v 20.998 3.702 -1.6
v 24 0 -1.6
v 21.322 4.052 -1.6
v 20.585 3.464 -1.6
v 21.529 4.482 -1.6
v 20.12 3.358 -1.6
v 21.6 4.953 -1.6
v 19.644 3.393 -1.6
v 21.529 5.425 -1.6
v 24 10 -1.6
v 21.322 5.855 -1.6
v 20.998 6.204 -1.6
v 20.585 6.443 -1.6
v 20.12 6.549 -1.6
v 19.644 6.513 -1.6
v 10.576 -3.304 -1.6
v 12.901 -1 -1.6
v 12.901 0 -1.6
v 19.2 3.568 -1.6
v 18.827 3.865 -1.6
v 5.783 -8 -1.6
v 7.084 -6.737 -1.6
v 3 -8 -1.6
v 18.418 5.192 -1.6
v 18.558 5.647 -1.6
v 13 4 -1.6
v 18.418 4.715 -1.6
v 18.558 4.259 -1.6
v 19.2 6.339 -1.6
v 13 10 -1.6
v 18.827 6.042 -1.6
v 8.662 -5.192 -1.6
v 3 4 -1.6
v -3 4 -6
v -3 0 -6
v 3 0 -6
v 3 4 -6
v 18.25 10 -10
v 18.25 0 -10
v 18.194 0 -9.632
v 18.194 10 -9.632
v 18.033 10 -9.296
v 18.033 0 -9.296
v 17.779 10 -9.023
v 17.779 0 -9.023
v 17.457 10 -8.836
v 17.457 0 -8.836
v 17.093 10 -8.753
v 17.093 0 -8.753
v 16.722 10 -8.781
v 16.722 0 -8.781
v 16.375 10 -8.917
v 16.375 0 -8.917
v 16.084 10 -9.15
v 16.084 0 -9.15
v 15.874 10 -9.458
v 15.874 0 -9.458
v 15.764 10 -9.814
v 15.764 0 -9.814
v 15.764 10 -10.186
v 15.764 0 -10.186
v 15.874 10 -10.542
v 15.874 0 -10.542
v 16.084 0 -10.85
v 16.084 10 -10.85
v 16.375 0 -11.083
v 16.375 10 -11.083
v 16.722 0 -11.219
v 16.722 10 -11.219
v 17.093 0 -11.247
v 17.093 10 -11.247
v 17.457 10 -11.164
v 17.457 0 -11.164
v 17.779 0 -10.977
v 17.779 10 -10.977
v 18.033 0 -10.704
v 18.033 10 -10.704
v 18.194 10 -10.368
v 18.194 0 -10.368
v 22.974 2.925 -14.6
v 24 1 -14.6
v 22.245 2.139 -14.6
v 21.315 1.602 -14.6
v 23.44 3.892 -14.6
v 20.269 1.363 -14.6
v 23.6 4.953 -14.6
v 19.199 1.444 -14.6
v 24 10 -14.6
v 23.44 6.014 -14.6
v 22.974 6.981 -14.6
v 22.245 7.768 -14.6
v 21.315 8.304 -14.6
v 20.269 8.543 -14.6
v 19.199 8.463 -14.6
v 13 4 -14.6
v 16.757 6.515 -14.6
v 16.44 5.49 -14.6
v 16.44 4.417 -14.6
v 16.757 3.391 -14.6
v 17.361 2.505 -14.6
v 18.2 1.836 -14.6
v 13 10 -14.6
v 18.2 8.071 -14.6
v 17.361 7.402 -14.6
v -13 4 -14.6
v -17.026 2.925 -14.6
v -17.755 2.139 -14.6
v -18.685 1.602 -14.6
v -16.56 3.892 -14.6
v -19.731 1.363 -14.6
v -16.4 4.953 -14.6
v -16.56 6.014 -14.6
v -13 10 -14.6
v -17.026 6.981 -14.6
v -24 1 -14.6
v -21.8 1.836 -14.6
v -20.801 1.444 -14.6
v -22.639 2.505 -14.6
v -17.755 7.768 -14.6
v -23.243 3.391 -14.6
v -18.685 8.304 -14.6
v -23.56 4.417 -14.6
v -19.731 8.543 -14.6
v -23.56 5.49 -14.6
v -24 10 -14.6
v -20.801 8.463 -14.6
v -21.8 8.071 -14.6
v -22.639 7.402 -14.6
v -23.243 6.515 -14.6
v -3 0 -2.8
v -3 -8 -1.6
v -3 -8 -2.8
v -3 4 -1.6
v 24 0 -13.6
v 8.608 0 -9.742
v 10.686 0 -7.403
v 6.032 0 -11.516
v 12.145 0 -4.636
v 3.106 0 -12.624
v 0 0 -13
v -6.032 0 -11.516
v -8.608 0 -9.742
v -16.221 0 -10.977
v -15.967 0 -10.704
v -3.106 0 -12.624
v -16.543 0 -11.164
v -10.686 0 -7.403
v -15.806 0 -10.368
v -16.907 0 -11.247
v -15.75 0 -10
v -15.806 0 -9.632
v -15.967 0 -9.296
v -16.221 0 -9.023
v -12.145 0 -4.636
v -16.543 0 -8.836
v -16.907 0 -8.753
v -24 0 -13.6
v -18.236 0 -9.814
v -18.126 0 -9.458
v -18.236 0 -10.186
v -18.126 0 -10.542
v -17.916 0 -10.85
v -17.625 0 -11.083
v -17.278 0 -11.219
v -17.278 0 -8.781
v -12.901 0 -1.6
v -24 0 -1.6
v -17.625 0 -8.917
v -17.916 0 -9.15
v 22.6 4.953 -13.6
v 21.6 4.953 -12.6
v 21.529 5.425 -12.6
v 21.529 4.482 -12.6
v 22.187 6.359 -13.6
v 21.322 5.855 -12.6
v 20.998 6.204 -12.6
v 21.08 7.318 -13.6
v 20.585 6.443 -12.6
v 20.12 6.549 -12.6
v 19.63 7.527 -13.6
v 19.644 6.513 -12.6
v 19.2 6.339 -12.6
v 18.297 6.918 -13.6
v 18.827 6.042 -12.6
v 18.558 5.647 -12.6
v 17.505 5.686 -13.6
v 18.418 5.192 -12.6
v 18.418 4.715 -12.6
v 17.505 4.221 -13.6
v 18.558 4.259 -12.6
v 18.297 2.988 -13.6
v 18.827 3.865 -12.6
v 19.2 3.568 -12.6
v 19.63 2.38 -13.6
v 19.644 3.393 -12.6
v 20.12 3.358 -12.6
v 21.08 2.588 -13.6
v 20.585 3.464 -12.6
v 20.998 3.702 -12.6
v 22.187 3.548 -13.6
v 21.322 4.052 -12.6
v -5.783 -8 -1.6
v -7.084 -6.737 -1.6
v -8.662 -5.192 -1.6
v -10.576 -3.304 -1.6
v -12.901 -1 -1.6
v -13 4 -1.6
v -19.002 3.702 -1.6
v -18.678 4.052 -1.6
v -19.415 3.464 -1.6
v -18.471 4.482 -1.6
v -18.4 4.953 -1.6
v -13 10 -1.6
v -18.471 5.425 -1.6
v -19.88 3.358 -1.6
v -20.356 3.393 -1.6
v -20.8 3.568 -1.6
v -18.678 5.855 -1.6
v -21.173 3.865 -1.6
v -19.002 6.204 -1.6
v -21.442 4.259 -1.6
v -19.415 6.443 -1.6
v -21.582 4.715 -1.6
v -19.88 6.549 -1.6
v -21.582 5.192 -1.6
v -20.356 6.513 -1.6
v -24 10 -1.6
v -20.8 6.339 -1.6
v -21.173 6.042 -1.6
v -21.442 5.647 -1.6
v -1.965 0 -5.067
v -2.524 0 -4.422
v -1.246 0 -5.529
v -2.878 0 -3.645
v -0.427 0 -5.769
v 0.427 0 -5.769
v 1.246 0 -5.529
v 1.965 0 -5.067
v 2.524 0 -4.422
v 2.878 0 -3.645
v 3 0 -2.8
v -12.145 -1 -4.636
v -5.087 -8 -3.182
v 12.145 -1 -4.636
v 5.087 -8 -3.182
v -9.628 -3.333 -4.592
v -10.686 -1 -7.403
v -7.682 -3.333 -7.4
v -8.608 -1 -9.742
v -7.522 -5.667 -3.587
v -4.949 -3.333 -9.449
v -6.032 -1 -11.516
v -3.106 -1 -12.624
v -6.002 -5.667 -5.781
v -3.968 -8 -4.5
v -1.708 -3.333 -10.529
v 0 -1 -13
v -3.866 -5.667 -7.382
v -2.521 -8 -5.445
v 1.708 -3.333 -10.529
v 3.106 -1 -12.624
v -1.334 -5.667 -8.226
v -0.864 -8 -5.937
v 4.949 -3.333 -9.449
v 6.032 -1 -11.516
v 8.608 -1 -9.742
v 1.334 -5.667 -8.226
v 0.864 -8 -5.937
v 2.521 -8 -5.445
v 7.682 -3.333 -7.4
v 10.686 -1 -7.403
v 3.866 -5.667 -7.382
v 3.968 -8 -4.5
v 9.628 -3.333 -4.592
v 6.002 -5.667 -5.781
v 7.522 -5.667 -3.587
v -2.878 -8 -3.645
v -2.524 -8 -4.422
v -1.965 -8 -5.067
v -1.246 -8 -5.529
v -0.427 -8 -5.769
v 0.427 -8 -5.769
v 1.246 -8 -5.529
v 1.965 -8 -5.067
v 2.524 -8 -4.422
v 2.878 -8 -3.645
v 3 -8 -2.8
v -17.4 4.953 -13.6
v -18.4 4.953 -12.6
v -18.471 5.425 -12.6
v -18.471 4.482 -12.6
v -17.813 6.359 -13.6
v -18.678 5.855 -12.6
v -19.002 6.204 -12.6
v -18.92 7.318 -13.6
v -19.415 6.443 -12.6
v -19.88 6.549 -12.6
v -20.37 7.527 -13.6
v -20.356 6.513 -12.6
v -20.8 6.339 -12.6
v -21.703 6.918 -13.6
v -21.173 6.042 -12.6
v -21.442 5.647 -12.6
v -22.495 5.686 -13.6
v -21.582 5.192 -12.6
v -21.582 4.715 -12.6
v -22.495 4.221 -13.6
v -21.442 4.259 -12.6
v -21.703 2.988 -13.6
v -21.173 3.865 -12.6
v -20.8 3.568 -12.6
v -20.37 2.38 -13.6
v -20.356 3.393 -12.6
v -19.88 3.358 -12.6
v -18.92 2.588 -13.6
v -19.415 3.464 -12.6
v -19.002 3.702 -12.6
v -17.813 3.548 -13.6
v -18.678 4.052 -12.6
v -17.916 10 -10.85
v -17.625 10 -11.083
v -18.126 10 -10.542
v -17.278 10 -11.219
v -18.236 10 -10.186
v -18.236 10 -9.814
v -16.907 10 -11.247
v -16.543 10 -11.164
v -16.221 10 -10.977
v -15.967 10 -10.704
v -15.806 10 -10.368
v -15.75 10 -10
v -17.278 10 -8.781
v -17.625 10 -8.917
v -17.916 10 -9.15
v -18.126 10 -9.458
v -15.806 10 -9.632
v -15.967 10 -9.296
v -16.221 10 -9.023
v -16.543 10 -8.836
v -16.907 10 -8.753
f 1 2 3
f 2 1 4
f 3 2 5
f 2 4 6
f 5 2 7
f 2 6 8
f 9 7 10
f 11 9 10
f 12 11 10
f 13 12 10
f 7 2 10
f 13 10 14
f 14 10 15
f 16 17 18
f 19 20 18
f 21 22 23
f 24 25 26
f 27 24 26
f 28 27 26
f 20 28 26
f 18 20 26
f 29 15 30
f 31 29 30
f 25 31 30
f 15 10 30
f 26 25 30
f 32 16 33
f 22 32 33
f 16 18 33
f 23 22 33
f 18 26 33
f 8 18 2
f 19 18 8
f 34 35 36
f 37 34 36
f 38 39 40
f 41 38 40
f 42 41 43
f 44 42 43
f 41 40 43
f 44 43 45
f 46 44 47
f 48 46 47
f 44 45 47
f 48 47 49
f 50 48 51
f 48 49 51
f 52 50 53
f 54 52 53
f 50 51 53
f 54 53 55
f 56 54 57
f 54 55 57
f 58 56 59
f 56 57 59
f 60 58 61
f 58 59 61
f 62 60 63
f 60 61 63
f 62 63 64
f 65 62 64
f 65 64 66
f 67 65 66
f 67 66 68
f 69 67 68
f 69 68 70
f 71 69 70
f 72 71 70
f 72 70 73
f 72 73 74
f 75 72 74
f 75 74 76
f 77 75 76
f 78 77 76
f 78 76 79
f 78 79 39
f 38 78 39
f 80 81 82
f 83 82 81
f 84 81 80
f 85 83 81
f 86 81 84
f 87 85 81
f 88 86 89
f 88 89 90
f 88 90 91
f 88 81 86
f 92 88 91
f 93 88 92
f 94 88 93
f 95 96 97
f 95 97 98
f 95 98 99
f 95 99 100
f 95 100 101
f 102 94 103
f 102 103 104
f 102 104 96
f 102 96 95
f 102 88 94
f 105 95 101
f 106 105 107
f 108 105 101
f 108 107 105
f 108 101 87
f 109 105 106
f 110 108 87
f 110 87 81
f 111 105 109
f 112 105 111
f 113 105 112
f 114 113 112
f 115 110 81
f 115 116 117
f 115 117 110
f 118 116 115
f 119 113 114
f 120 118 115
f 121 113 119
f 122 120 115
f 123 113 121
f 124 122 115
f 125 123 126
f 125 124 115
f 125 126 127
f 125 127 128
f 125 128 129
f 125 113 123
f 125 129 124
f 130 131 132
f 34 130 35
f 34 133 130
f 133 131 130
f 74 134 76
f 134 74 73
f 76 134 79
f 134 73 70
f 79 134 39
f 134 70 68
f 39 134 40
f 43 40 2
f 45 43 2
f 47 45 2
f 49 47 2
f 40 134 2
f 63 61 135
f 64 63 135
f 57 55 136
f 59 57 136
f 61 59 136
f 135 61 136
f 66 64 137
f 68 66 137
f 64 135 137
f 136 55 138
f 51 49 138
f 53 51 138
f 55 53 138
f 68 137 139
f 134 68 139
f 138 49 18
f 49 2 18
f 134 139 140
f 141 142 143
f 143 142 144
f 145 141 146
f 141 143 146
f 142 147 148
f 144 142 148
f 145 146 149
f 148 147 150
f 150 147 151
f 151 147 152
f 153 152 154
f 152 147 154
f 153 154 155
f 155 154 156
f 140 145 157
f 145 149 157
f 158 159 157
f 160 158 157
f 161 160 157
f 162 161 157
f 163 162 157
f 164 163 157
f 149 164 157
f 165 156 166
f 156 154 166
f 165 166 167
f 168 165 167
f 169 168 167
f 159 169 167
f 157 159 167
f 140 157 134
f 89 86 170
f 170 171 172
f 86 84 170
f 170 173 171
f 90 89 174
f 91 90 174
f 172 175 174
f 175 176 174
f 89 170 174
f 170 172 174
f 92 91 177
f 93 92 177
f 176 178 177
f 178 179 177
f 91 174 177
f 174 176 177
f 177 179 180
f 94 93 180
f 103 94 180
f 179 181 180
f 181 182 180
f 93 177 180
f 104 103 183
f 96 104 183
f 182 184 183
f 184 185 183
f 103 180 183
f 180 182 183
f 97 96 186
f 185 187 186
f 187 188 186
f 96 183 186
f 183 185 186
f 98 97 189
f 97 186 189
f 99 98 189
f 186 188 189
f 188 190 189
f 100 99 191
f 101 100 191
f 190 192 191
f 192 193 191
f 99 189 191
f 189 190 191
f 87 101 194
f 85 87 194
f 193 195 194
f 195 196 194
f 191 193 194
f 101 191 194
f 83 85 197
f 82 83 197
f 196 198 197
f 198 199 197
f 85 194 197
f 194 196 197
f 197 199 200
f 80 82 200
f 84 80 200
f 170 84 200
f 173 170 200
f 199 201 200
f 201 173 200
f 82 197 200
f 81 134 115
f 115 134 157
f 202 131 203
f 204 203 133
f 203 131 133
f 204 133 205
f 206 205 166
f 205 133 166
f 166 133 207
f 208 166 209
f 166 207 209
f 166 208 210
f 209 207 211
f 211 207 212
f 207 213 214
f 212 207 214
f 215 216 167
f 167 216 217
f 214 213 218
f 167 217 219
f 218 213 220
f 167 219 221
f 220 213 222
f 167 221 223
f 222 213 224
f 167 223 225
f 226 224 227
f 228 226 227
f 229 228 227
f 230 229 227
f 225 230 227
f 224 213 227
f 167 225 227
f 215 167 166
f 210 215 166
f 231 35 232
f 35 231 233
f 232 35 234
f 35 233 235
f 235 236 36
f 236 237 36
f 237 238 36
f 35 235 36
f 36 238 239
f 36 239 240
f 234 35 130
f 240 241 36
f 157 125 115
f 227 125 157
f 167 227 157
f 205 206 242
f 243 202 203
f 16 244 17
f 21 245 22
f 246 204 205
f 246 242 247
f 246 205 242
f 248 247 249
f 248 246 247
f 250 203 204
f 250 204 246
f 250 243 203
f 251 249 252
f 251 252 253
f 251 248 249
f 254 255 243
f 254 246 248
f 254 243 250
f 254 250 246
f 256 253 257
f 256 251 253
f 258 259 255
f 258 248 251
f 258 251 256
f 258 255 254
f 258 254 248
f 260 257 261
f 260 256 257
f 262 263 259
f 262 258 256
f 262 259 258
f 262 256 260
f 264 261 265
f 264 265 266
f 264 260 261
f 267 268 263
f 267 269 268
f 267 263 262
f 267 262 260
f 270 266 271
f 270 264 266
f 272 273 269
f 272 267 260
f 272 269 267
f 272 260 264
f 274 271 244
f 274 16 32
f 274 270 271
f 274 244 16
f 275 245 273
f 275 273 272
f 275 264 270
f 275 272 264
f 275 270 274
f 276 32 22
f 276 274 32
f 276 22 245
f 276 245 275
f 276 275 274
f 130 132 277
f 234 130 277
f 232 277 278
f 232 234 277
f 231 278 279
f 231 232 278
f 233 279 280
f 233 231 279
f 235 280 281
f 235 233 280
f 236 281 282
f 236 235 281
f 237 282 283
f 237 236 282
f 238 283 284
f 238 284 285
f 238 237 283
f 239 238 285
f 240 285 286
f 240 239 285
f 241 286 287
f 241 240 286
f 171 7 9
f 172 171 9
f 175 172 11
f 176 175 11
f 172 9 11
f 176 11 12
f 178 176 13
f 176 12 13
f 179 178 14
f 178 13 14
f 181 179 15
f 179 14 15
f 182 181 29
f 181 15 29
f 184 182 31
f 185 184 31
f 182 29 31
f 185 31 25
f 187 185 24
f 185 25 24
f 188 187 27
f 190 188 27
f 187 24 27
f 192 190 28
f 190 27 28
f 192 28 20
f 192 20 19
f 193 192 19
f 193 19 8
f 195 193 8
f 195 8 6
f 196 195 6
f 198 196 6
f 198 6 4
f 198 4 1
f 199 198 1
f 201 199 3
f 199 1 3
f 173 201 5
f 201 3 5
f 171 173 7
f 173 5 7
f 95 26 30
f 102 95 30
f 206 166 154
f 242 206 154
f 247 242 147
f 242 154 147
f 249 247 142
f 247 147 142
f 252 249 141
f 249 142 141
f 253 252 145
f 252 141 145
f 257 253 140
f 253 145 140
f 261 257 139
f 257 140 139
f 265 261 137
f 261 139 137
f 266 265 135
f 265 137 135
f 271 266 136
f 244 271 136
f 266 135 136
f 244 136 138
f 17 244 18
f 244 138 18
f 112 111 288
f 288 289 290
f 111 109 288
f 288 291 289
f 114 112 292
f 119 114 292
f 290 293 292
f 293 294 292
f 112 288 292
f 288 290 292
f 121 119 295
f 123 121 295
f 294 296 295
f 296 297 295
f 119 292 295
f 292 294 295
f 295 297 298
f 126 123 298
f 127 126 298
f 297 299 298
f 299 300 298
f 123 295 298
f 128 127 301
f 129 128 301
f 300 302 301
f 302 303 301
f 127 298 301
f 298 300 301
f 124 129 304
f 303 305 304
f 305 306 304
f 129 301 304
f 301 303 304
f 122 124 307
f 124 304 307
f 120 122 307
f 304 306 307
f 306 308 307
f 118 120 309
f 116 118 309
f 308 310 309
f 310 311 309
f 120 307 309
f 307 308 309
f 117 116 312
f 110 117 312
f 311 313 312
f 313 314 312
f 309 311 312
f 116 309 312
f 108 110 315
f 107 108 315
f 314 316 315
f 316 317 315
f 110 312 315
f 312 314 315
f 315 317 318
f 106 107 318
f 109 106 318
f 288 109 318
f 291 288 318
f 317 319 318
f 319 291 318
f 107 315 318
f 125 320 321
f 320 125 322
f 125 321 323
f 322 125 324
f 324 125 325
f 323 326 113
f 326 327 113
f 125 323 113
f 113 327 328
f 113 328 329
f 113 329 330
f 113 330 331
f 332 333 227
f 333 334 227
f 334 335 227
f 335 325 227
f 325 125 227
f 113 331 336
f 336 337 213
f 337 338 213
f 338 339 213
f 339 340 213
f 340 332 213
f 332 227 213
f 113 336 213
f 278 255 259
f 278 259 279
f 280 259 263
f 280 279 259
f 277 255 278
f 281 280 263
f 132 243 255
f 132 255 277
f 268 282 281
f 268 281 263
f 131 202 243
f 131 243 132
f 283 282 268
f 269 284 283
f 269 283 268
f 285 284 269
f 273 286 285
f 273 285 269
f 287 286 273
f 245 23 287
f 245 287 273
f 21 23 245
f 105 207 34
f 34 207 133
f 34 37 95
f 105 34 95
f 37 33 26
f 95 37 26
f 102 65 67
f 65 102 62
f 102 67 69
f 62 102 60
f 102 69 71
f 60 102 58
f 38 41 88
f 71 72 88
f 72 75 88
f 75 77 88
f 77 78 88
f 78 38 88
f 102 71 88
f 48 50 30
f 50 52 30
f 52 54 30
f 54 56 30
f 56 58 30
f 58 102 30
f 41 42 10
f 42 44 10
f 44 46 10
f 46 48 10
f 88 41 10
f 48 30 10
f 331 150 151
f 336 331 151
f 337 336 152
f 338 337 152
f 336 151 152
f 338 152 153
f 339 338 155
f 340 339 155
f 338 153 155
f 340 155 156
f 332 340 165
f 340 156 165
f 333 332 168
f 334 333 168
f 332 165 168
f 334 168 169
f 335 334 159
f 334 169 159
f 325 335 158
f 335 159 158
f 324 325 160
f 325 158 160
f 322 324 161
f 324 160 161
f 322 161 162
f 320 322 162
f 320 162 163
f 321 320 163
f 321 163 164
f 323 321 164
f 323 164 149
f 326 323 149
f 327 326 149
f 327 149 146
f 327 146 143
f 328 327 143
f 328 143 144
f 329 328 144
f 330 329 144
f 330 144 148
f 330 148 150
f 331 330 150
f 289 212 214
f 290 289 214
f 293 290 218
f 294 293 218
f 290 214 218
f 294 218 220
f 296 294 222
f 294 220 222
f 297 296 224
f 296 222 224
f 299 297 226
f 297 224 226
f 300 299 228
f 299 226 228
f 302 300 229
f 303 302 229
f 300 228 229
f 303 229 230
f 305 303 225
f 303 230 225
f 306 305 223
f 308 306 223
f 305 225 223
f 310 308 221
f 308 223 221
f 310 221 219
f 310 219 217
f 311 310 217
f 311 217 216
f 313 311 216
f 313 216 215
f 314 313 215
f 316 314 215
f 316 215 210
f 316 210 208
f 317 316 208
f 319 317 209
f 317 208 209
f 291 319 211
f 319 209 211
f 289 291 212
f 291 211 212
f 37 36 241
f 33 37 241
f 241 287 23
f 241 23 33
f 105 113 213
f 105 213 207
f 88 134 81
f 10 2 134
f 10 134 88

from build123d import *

# Parameters (mm, degrees)
PAD008_DEPTH    = 8
CHAMFER001_SIZE = 7
SKETCH026_R     = 1.6
PAD009_DEPTH    = 13
SKETCH030_W     = 6
SKETCH030_H     = 6
POCKET014_DEPTH = 10
SKETCH031_R     = 1.25
POCKET015_DEPTH = 10.001
CHAMFER003_SIZE = 2
CHAMFER004_SIZE = 1


with BuildPart() as part:
    # Sketch025 → Pad008 (new body)
    with BuildSketch(Plane.XZ):
        with BuildLine():
            ThreePointArc((-12.901163, -1.6), (0, -13), (12.901163, -1.6))
            Line((3, -1.6), (12.901163, -1.6))
            Line((3, -2.8), (3, -1.6))
            ThreePointArc((-3, -2.8), (0, -5.8), (3, -2.8))
            Line((-3, -1.6), (-3, -2.8))
            Line((-3, -1.6), (-12.901163, -1.6))
        make_face()
    extrude(amount=PAD008_DEPTH)

    # Chamfer001
    chamfer001_edges = [part.edges().sort_by_distance(p)[0] for p in [
        (0, -8, -13),
    ]]
    chamfer(chamfer001_edges, length=CHAMFER001_SIZE)

    # Sketch026 → Pad009 (join)
    with BuildSketch(Plane.XY.offset(-1.6)):
        Polygon((24, 0), (-24, 0), (-24, 8.5), (-24, 10), (-13, 10), (-13, 4), (13, 4), (13, 10), (24, 10), (24, 8.5), align=None)
        with Locations((-20, 4.953278)):
            Circle(SKETCH026_R, mode=Mode.SUBTRACT)
        with Locations((20, 4.953278)):
            Circle(SKETCH026_R, mode=Mode.SUBTRACT)
    extrude(amount=-PAD009_DEPTH)

    # Sketch030 → Pocket014 (cut)
    with BuildSketch(Plane.XZ):
        with Locations((0, -3)):
            Rectangle(SKETCH030_W, SKETCH030_H)
    extrude(amount=-POCKET014_DEPTH, mode=Mode.SUBTRACT)

    # Sketch031 → Pocket015 (cut, through all)
    with BuildSketch(Plane.XZ):
        with Locations((-17, -10)):
            Circle(SKETCH031_R)
        with Locations((17, -10)):
            Circle(SKETCH031_R)
    extrude(amount=-POCKET015_DEPTH, mode=Mode.SUBTRACT)

    # Chamfer003
    chamfer003_edges = [part.edges().sort_by_distance(p)[0] for p in [
        (18.4, 4.953278, -14.6),
        (-21.6, 4.953278, -14.6),
    ]]
    chamfer(chamfer003_edges, length=CHAMFER003_SIZE)

    # Chamfer004
    chamfer004_edges = [part.edges().sort_by_distance(p)[0] for p in [
        (0, 0, -14.6),
    ]]
    chamfer(chamfer004_edges, length=CHAMFER004_SIZE)


solid = part.part
